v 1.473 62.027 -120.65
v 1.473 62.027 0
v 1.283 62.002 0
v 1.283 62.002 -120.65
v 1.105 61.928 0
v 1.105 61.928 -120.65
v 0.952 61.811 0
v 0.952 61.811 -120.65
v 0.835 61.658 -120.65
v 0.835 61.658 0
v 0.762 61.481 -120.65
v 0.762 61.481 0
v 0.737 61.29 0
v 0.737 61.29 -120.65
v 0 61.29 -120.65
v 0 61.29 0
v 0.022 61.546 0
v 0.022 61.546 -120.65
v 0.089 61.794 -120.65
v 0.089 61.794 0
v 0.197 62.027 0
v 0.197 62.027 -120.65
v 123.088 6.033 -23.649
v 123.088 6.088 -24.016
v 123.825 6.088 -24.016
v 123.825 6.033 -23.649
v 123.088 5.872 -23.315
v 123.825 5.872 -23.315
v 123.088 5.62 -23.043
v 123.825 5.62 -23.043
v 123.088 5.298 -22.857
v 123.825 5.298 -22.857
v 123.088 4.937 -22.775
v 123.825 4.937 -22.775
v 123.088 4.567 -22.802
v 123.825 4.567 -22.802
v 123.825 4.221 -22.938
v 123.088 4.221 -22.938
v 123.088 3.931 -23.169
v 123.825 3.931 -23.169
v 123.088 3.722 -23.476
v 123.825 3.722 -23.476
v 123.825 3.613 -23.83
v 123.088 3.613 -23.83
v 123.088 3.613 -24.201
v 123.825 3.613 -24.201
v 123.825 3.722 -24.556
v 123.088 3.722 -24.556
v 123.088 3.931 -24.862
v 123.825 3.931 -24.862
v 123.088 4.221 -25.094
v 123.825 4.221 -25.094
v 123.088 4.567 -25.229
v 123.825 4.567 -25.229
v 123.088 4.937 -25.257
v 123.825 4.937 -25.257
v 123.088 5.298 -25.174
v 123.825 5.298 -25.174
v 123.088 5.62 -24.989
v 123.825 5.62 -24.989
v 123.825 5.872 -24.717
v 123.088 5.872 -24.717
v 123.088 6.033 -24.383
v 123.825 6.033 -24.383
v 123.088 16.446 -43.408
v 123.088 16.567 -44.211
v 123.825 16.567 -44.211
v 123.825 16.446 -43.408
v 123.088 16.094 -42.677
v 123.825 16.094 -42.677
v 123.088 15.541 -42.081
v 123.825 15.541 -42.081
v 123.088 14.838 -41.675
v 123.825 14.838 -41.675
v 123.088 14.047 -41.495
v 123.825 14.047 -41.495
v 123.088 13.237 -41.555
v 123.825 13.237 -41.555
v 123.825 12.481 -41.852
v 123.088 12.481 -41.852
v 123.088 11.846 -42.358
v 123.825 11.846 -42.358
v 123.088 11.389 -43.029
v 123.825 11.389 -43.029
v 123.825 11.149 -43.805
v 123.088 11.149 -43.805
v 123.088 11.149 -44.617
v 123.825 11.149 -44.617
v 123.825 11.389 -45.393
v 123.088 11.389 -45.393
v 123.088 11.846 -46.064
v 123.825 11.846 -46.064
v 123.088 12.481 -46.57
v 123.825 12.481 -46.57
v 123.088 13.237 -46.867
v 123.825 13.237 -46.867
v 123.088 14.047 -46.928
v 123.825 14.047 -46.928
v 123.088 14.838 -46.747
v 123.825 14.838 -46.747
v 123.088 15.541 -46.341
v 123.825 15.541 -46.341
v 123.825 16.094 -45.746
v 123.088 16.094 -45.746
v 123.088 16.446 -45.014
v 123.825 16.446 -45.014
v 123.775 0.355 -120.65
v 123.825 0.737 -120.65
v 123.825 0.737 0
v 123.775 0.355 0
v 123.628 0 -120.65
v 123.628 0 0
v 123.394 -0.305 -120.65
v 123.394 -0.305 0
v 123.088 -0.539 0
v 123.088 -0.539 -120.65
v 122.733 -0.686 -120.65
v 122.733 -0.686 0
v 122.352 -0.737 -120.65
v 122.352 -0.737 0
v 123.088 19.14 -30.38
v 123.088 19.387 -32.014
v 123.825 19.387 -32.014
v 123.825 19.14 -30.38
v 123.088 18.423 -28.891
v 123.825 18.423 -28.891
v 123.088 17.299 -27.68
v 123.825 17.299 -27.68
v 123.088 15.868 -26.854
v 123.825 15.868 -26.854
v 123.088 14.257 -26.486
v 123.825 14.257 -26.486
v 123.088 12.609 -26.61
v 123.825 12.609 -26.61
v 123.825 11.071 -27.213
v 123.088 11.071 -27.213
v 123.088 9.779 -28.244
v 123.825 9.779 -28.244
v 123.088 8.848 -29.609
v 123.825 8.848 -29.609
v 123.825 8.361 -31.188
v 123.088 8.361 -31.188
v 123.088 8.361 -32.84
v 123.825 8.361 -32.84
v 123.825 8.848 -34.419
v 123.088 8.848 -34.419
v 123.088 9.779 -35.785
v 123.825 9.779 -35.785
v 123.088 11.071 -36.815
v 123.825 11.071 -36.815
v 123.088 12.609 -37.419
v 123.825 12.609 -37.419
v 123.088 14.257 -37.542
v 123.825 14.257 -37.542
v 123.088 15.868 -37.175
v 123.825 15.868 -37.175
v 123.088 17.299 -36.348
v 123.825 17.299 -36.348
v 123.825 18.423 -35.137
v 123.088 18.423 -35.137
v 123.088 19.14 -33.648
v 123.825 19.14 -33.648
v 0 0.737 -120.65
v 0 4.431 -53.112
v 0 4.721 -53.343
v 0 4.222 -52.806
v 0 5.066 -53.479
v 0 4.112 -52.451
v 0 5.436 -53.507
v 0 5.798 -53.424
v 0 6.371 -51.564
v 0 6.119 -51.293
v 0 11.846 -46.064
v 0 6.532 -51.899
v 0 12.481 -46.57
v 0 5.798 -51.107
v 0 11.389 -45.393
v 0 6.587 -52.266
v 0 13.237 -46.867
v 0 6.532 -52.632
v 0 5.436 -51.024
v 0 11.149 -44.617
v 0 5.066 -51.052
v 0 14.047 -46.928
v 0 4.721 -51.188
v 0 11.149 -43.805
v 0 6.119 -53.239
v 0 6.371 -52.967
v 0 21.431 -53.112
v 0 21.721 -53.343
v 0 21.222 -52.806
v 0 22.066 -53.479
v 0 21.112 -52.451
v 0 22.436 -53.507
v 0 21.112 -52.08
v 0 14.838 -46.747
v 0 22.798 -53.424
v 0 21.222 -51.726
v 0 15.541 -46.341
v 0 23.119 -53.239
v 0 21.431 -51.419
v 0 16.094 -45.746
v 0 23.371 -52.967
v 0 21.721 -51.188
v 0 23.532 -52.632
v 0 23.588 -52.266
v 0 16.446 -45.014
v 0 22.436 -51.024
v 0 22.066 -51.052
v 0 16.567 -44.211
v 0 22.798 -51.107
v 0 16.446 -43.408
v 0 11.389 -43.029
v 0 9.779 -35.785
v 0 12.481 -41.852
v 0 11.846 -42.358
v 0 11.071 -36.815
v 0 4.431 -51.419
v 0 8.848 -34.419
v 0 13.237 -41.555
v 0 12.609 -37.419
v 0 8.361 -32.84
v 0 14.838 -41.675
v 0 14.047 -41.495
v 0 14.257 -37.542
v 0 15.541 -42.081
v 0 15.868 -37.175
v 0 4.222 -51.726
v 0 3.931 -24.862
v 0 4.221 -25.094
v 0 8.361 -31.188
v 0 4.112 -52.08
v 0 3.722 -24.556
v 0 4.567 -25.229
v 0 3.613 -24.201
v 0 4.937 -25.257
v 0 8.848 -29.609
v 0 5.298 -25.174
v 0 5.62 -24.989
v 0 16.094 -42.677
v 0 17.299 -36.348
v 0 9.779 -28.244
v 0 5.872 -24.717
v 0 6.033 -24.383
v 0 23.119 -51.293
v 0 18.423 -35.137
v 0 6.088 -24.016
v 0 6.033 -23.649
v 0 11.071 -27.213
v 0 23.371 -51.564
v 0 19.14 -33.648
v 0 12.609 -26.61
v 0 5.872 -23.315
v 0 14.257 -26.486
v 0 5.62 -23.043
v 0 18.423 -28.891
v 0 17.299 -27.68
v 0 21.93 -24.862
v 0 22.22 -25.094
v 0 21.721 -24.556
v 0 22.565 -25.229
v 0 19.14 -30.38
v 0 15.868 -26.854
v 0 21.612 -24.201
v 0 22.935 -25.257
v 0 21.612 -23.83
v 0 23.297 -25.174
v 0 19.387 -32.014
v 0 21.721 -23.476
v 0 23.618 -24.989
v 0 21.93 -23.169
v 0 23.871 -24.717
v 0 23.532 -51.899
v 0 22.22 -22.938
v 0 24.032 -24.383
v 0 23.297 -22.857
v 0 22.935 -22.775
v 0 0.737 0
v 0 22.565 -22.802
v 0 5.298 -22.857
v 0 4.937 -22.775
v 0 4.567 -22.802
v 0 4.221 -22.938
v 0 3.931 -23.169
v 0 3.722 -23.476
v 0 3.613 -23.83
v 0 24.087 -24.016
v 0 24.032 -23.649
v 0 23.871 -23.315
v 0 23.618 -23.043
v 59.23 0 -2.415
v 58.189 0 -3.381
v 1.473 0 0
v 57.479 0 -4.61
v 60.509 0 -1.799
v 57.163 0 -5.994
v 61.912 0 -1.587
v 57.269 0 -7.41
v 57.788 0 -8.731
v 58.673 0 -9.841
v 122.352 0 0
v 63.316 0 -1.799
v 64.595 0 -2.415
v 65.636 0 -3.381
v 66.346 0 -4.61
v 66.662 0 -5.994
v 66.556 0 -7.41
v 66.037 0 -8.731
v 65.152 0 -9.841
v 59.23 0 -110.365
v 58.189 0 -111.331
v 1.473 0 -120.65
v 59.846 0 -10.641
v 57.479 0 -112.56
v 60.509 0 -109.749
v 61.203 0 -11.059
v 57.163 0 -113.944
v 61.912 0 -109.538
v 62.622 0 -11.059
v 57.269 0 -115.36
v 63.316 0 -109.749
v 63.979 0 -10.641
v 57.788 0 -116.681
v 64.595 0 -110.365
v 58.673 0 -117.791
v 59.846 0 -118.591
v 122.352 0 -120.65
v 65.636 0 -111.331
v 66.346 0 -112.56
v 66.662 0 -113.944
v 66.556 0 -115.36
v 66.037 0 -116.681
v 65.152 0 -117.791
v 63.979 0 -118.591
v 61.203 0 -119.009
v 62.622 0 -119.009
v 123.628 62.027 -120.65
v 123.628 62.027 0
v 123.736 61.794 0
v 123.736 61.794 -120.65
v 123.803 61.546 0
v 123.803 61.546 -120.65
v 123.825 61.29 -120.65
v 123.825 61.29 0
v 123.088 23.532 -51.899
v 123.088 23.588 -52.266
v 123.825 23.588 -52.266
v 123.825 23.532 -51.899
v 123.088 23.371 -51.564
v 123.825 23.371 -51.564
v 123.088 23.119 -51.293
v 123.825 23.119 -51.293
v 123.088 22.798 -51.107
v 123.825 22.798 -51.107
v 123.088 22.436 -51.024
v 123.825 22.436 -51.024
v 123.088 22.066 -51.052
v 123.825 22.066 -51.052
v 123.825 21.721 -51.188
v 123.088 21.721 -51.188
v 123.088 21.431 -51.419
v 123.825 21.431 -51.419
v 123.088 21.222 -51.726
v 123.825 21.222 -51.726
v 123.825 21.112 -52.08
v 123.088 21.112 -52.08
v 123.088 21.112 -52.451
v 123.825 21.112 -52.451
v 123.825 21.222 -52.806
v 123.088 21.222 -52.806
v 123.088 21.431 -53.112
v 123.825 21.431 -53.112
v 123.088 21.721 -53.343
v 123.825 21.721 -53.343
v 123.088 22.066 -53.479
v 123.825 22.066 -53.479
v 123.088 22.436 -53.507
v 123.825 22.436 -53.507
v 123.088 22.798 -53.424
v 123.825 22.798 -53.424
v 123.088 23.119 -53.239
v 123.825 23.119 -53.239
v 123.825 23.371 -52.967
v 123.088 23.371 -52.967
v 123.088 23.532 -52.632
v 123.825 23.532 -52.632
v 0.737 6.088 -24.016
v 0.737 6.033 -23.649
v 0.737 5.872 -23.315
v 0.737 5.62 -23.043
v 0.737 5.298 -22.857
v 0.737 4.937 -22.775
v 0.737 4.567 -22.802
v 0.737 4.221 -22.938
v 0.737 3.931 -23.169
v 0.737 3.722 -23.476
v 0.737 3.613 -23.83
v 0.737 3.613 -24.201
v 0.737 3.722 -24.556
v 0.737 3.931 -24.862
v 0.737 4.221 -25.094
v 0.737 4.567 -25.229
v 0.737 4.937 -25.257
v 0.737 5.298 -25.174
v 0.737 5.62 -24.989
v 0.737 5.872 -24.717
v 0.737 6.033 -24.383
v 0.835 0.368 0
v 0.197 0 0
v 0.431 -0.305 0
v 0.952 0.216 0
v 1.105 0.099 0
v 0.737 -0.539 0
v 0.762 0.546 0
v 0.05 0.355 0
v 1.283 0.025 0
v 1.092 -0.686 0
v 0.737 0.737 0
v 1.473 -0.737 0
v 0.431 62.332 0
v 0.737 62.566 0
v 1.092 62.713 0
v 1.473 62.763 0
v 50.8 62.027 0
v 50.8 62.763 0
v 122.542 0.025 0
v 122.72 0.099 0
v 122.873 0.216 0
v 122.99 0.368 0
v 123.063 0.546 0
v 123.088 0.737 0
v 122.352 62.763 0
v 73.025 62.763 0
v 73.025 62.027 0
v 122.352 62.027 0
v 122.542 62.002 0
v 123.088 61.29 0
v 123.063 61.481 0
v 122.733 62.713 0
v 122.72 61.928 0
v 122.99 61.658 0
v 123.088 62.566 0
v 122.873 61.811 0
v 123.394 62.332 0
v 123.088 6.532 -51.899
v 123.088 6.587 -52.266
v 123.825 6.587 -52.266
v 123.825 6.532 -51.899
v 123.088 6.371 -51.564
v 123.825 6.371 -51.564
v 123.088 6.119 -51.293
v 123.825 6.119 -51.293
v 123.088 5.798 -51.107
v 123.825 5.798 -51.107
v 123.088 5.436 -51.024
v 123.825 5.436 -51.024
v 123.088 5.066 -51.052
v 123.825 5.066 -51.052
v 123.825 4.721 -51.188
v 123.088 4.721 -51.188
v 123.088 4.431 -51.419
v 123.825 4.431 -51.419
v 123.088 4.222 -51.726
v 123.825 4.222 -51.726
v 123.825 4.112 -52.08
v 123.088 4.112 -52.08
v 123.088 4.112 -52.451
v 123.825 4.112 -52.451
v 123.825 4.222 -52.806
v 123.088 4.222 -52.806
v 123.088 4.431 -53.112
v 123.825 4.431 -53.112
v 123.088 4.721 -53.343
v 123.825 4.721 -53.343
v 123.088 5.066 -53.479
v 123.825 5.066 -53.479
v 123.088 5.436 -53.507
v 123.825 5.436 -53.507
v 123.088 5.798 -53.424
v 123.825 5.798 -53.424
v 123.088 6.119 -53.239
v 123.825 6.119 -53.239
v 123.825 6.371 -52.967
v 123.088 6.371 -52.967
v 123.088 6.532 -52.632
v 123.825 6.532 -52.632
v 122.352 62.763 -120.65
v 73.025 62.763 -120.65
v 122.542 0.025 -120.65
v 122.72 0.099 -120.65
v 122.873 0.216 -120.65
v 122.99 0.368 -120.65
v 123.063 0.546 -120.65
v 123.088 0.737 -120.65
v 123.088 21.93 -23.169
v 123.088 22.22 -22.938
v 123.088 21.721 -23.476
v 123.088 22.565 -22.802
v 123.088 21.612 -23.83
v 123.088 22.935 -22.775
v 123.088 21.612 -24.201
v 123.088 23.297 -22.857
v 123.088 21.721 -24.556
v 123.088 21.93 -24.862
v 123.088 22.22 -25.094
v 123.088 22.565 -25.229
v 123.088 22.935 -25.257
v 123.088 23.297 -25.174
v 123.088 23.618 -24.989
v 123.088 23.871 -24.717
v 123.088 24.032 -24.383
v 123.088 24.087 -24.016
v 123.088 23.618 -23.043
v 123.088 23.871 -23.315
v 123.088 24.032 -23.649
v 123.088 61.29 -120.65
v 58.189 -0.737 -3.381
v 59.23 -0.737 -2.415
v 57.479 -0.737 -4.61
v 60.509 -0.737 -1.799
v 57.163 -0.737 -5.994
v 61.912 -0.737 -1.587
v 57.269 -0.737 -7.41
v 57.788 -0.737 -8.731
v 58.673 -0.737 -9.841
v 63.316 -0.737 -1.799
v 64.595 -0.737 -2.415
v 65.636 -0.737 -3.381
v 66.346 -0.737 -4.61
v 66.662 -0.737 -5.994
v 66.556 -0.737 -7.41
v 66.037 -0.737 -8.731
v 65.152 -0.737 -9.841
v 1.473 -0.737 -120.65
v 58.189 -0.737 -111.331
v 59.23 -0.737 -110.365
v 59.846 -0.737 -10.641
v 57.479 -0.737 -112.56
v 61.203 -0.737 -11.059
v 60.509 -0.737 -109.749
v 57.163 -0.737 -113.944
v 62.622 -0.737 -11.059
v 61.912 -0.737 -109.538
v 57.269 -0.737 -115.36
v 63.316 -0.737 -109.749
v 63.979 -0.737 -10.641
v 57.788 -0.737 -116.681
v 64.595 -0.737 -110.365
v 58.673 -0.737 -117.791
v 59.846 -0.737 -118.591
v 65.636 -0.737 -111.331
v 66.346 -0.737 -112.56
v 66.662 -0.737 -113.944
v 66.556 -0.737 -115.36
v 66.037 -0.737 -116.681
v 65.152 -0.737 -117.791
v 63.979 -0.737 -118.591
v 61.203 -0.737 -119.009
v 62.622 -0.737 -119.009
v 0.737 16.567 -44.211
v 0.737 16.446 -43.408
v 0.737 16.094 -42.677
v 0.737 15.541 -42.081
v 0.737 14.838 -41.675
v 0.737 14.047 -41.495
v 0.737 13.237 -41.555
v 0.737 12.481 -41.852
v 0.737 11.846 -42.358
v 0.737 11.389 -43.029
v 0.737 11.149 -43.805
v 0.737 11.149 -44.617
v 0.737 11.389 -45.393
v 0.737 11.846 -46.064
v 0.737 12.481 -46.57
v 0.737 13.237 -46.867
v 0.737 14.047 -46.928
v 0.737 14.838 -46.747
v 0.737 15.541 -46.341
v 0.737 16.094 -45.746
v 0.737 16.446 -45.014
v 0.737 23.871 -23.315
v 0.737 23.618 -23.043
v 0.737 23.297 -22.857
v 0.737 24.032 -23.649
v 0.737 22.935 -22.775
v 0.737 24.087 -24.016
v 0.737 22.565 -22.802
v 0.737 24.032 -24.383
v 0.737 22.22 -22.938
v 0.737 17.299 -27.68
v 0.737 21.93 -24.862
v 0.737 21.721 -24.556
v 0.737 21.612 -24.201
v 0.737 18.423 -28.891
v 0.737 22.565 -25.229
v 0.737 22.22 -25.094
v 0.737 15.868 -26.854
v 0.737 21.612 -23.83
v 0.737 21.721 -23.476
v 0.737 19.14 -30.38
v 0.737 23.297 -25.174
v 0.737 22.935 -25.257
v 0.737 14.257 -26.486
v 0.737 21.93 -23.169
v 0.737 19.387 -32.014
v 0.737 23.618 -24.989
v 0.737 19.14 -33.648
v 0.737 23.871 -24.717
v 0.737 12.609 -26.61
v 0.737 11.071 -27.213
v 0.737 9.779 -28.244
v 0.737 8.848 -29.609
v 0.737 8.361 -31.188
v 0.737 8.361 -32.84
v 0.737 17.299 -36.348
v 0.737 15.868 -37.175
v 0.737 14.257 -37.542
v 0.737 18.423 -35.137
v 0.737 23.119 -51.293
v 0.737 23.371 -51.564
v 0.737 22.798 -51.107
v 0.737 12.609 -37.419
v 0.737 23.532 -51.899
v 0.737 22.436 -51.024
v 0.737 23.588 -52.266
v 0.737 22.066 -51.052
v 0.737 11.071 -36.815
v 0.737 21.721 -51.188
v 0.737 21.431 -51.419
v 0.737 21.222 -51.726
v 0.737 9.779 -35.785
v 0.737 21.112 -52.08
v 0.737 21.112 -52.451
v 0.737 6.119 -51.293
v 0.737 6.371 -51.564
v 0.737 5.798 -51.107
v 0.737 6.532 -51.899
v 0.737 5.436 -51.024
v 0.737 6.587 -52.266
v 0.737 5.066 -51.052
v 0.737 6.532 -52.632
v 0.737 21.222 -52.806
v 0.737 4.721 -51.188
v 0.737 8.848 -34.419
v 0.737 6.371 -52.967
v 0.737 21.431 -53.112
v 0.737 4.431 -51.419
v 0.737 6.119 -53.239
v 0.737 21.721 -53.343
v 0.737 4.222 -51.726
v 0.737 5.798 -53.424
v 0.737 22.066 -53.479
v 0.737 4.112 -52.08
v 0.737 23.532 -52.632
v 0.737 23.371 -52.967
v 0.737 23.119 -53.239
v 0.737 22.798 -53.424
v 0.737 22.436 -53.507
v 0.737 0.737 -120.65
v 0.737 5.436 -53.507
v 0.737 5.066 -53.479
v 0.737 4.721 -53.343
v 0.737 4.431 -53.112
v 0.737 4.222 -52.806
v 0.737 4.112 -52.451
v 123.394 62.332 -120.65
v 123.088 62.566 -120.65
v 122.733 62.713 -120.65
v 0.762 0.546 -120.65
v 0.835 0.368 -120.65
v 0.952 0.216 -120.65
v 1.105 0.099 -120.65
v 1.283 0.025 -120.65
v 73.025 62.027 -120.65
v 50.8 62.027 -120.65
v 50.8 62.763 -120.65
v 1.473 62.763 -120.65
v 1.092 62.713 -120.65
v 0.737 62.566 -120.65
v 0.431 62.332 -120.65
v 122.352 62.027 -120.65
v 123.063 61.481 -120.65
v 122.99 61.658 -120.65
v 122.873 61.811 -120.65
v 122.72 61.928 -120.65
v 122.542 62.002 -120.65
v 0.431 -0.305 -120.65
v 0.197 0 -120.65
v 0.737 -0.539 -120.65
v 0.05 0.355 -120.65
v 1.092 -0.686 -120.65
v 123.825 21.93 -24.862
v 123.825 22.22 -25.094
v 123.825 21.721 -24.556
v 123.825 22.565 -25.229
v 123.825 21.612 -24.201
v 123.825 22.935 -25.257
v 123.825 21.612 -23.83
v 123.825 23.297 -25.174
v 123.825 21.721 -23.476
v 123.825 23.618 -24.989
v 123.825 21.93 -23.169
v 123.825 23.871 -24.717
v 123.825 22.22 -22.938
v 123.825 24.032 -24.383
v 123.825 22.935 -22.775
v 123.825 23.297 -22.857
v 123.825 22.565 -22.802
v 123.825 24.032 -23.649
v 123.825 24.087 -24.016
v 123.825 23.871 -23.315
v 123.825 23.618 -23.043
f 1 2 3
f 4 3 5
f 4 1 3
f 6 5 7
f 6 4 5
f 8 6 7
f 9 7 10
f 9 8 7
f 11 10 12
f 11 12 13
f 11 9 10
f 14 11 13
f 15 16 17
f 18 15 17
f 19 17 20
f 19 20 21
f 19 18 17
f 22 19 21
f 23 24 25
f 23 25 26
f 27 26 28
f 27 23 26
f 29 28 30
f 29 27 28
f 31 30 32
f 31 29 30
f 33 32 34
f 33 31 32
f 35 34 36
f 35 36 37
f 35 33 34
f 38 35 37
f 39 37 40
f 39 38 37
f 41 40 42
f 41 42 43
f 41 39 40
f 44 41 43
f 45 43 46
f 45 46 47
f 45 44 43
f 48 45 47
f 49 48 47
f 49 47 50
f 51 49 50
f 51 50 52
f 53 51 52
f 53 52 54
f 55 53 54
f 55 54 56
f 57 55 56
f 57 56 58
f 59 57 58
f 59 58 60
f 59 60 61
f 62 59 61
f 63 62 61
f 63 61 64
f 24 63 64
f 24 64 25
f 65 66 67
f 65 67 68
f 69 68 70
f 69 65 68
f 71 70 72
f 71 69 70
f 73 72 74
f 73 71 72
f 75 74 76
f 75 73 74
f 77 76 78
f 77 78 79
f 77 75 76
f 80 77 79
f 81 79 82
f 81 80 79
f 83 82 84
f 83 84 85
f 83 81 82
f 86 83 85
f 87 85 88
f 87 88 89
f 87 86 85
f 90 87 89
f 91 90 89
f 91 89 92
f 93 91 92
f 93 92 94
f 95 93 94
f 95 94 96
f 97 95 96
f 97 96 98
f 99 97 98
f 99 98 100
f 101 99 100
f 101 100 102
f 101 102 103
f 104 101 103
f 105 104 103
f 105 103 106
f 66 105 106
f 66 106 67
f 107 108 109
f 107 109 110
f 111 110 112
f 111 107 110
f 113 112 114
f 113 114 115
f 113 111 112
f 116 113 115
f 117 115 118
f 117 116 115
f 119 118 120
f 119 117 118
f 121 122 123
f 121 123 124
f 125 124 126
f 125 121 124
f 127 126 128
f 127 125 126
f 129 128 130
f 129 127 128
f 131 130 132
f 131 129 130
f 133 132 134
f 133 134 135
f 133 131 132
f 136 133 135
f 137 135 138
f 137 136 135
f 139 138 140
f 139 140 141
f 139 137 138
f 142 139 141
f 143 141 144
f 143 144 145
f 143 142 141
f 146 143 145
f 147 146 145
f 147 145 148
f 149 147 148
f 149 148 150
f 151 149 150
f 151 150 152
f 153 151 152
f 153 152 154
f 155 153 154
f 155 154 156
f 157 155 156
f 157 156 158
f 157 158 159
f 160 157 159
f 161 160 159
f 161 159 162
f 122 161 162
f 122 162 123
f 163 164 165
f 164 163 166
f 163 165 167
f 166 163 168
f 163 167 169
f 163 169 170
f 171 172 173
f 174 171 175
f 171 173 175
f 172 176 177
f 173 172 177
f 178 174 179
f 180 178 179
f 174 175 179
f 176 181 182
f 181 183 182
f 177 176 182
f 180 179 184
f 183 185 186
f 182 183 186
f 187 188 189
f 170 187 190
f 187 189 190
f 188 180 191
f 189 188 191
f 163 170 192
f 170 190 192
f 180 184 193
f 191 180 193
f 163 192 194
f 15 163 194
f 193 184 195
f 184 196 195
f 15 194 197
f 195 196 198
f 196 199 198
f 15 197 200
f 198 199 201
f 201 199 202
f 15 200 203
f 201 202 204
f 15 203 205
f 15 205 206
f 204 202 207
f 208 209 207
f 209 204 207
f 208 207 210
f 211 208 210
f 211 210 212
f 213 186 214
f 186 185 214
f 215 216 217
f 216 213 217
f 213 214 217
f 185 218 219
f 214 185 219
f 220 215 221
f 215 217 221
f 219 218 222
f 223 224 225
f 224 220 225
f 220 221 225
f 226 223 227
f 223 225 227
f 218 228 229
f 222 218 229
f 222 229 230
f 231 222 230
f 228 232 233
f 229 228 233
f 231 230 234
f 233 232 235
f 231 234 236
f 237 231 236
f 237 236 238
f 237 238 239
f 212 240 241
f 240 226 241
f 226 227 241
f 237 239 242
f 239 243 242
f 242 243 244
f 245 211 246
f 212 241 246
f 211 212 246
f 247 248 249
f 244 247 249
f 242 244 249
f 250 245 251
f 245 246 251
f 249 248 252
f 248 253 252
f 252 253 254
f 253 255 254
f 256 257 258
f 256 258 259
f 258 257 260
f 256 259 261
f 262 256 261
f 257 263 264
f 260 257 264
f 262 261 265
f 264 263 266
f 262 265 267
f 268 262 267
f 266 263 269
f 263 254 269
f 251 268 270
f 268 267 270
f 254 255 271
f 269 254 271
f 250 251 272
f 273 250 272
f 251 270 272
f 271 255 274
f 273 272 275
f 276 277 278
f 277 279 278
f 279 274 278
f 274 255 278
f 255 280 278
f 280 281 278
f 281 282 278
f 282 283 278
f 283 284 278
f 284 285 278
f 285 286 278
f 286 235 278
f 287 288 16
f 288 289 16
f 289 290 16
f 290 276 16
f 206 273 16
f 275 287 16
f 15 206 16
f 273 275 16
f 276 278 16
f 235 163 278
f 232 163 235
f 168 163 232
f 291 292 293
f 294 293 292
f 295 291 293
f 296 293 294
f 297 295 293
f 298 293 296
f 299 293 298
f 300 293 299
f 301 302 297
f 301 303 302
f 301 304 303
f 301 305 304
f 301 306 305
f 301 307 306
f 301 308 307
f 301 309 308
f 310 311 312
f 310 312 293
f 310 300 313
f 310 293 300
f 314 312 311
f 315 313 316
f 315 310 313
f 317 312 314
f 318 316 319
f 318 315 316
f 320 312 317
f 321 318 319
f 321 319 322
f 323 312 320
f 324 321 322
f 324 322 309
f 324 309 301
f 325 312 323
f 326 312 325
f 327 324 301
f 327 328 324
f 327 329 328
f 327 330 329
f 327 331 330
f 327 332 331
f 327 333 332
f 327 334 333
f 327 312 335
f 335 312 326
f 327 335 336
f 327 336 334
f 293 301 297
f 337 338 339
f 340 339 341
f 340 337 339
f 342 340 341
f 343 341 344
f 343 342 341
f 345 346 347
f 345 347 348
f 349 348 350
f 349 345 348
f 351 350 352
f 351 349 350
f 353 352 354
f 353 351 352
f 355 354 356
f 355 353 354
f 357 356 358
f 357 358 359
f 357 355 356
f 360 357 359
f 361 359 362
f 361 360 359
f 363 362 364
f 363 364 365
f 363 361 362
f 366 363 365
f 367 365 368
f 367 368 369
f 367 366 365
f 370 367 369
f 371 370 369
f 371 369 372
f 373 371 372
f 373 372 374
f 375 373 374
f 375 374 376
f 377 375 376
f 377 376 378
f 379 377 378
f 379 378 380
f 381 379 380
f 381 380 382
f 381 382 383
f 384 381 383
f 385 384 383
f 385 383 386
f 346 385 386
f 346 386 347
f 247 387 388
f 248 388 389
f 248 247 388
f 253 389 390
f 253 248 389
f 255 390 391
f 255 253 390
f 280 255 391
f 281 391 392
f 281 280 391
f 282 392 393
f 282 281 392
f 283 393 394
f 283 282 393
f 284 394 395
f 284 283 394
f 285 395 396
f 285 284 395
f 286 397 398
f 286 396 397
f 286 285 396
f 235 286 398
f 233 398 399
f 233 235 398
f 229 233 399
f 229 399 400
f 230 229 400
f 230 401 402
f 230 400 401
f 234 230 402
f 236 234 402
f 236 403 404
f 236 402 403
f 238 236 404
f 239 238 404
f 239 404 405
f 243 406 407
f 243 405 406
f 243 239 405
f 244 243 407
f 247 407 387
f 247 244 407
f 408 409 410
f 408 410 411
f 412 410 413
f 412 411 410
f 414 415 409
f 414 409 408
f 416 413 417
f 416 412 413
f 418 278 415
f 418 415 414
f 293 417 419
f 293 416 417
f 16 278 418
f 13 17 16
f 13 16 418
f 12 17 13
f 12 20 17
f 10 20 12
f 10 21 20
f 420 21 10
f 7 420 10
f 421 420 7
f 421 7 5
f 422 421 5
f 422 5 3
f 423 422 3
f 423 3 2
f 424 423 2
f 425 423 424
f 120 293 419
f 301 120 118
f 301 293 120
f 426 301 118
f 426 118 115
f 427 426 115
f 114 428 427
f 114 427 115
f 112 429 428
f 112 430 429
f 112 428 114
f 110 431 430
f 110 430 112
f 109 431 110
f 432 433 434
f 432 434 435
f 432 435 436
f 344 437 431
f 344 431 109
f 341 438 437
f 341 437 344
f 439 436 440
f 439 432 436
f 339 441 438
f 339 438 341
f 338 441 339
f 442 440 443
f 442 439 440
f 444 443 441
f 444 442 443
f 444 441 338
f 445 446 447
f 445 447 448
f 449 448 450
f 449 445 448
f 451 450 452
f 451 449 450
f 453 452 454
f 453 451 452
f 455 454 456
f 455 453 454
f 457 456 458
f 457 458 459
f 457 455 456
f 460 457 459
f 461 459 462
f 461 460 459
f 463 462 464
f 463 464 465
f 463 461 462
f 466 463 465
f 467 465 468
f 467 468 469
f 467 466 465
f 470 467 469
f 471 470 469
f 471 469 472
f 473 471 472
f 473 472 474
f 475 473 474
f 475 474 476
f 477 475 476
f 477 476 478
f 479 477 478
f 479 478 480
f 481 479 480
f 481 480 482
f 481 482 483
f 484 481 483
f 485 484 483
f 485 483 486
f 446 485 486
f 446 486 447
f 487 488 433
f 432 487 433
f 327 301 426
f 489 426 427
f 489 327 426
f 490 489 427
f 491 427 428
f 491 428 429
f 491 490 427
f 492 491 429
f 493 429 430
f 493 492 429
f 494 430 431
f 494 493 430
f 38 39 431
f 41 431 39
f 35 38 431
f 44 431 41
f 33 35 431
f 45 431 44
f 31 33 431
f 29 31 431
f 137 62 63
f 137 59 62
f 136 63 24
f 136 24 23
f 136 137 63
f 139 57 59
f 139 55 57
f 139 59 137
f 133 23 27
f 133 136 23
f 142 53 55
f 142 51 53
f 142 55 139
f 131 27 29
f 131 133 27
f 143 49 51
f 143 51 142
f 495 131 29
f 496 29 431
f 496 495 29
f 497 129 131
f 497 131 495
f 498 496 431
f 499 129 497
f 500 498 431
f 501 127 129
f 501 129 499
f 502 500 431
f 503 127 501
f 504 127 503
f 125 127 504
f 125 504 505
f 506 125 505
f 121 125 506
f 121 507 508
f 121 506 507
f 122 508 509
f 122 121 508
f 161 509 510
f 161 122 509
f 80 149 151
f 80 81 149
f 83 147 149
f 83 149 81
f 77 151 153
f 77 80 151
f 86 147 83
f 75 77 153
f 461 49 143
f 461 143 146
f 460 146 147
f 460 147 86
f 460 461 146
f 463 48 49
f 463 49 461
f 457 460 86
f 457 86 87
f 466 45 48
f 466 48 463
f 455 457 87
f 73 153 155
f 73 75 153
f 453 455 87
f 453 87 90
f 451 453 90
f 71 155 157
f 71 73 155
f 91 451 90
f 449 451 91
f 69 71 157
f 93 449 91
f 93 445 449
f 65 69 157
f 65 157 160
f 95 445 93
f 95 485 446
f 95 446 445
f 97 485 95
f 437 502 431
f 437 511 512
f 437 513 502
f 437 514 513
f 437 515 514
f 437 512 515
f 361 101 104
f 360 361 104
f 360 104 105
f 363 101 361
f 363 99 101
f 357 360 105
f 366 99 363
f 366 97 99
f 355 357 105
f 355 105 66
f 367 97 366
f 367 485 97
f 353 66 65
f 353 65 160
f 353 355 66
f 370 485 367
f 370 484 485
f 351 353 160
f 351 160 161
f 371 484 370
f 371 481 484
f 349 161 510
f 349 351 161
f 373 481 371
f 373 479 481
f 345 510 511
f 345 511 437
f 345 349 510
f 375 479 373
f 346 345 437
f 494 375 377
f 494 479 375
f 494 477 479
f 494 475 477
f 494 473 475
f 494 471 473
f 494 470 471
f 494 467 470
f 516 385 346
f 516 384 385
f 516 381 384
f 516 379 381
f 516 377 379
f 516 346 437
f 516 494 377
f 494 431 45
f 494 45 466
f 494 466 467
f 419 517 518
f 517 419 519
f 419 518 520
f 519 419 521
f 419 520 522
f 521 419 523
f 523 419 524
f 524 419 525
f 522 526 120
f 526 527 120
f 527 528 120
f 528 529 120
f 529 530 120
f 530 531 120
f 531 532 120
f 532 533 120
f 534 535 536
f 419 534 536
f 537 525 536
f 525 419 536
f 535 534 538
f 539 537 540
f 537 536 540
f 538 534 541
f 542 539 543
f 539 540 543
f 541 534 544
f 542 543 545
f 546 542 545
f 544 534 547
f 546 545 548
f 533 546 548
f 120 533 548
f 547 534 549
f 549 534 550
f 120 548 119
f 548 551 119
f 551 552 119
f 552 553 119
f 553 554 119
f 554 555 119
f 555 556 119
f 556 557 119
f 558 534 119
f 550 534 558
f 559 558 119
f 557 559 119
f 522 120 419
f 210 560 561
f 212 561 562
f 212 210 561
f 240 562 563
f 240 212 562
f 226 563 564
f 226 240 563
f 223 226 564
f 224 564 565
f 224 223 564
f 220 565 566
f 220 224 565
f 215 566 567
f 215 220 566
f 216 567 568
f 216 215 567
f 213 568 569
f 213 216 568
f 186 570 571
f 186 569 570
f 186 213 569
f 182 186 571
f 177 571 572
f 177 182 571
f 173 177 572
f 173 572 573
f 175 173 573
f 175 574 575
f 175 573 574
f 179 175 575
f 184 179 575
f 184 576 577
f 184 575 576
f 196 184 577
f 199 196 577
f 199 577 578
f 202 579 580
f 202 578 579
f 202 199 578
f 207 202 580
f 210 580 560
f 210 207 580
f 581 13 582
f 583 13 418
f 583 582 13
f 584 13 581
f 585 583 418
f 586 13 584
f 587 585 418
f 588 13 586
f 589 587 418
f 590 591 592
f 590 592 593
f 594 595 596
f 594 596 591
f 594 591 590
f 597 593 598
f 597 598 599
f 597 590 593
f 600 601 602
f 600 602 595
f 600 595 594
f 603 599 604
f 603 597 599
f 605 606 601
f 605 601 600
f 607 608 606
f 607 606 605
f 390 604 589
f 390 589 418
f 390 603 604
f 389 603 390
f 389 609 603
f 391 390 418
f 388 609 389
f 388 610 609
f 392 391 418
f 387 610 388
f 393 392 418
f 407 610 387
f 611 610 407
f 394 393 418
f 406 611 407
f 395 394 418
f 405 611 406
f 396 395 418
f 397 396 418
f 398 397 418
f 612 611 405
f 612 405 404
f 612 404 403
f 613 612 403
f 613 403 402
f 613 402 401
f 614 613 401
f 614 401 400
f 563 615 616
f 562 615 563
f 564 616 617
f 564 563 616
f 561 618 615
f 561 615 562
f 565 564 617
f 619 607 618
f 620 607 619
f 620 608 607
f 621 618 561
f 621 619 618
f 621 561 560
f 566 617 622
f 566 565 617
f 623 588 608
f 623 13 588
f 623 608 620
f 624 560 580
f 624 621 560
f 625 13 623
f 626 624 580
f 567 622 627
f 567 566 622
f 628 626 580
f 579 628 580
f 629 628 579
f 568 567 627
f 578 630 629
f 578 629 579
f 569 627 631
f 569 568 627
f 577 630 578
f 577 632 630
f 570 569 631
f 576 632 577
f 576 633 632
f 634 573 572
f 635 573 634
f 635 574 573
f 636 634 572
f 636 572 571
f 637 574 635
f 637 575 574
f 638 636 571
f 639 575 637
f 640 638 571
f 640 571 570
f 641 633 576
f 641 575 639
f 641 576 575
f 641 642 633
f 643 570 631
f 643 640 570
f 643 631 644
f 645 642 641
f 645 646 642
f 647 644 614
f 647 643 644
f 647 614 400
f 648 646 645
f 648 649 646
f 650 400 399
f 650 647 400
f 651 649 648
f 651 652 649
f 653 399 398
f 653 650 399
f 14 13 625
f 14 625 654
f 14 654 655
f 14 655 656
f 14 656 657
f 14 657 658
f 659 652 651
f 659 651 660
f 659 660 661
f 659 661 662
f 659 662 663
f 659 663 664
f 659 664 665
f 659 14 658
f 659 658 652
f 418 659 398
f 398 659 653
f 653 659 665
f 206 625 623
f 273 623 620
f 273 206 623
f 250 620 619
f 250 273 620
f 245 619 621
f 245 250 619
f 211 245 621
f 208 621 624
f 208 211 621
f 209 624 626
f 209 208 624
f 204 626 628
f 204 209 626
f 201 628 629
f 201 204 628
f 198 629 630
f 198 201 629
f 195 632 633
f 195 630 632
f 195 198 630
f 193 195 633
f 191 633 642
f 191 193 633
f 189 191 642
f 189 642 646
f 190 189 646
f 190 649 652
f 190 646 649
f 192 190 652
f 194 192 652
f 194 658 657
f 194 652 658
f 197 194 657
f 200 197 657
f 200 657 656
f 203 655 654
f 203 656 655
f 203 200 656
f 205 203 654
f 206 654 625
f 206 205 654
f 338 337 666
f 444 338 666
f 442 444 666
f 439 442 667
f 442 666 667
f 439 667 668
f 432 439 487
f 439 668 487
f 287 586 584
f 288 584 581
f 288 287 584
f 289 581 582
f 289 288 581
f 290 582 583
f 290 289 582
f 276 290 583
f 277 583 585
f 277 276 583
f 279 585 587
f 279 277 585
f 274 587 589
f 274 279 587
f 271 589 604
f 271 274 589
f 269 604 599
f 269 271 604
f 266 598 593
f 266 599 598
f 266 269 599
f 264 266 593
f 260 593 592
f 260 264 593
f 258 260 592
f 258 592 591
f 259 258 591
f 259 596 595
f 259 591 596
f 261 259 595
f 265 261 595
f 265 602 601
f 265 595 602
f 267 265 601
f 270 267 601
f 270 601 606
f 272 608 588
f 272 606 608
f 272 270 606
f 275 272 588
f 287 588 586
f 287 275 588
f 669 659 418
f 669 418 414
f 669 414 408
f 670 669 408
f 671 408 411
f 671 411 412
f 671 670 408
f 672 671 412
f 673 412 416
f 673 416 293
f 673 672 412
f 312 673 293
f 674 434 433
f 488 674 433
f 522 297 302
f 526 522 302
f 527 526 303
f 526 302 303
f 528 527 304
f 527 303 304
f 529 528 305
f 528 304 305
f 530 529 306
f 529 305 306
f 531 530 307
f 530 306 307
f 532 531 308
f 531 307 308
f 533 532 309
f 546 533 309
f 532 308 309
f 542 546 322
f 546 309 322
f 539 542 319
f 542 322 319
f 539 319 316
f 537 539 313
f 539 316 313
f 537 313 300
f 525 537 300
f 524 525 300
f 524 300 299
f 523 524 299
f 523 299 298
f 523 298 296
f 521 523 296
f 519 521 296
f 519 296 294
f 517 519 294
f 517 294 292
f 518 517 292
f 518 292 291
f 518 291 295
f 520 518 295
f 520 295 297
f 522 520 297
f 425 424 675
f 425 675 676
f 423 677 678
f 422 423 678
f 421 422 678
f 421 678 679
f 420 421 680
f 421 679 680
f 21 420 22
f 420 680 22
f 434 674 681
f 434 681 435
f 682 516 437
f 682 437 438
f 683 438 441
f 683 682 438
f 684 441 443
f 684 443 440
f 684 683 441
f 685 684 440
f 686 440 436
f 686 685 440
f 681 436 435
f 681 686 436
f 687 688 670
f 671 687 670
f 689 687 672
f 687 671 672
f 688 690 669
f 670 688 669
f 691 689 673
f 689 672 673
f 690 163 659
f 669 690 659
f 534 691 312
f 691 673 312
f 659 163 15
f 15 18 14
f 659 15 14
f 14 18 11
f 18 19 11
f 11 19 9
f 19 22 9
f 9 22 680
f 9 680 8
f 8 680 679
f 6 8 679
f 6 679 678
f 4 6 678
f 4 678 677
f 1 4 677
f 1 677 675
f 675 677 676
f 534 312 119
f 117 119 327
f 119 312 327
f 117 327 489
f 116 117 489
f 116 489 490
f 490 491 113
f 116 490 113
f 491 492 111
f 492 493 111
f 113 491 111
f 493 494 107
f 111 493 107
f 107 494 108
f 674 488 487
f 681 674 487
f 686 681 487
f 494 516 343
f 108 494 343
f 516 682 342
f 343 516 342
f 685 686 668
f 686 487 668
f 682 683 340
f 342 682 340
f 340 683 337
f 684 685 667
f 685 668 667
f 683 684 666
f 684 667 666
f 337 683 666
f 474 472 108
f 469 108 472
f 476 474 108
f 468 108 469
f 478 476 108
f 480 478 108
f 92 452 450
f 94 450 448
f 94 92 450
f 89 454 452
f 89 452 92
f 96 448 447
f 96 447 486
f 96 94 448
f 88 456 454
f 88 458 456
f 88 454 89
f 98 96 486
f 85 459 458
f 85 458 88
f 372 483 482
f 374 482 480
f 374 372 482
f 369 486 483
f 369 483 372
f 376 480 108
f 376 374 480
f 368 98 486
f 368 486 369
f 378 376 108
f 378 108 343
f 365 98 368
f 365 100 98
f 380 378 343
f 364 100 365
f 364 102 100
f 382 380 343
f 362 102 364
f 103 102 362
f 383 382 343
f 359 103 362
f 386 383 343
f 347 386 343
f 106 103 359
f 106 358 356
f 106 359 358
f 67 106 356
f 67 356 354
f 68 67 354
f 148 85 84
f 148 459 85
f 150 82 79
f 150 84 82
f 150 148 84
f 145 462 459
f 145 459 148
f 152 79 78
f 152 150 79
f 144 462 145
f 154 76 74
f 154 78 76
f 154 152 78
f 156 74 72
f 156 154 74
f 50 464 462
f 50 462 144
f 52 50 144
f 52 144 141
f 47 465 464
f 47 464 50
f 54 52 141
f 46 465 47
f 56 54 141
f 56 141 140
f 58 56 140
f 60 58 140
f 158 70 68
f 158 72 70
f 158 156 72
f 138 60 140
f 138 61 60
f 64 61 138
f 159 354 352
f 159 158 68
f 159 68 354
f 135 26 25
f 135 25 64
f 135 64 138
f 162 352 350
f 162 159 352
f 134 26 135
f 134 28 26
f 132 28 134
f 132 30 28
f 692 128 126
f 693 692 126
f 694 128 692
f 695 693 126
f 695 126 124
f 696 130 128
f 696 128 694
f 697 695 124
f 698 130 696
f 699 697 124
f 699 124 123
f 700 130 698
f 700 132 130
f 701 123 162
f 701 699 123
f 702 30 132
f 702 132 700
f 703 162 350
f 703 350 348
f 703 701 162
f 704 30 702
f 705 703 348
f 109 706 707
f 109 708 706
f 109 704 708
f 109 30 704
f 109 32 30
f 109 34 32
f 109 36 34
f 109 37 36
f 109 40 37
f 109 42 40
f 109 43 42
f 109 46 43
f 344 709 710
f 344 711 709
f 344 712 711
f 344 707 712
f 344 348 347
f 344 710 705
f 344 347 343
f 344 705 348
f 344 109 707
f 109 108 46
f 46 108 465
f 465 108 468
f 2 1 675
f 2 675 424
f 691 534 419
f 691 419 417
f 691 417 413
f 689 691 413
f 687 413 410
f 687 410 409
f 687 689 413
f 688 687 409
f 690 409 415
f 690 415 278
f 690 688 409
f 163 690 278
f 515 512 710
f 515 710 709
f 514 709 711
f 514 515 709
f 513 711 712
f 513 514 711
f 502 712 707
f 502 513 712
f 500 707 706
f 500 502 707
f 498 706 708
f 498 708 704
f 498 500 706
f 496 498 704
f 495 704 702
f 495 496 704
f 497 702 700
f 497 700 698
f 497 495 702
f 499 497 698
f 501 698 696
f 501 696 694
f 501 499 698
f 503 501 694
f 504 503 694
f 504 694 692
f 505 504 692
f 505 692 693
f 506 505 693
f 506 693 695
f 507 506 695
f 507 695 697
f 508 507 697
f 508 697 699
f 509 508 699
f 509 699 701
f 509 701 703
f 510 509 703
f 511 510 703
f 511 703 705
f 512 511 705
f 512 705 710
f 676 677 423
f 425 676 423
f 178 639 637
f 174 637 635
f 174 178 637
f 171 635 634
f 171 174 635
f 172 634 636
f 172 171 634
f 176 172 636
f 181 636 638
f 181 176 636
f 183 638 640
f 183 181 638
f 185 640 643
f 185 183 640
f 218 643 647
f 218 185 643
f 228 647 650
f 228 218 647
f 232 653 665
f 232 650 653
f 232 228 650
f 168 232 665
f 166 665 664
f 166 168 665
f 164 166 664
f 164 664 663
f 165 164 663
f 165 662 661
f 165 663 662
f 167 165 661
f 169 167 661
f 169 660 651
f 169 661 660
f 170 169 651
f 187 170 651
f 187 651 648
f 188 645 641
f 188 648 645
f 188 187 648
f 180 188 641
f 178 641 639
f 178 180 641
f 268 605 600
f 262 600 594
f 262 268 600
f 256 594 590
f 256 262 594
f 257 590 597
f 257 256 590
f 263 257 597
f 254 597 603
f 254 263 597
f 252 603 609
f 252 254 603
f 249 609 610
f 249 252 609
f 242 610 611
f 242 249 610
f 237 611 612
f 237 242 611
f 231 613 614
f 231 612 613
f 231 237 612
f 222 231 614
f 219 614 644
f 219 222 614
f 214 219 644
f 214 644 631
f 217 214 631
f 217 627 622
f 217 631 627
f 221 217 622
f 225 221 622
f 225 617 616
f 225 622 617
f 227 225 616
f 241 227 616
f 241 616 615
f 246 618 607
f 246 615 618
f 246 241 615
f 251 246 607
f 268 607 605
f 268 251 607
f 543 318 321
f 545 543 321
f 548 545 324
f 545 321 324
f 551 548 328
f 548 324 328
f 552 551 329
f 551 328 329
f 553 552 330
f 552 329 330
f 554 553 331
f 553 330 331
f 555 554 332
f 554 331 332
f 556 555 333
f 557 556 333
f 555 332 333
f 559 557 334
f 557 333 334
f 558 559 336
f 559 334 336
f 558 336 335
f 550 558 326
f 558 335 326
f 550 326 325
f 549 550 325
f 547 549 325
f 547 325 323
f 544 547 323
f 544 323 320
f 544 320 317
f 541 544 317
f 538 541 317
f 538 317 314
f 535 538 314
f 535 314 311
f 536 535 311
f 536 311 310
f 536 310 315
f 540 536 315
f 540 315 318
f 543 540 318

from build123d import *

# Parameters (mm, degrees)
SKETCH1_W                      = 123.825
SKETCH1_H                      = 120.65
BASE_FLANGE1_DEPTH             = 0.7366
EDGE_FLANGE1_STRIP_W           = 4.4196
EDGE_FLANGE1_STRIP_H           = 0.7366
EDGE_FLANGE1_STRIP_CUT_DEPTH   = 120.65
EDGE_FLANGE1_STRIP_2_W         = 4.4196
EDGE_FLANGE1_STRIP_2_H         = 0.7366
EDGE_FLANGE1_STRIP_CUT_2_DEPTH = 120.65
EDGE_FLANGE1_DEPTH             = 120.65
EDGE_FLANGE1_BEND_DEPTH        = 120.65
EDGE_FLANGE2_STRIP_W           = 4.4196
EDGE_FLANGE2_STRIP_H           = 0.7366
EDGE_FLANGE2_STRIP_CUT_DEPTH   = 120.65
EDGE_FLANGE2_DEPTH             = 120.65
EDGE_FLANGE3_STRIP_W           = 4.4196
EDGE_FLANGE3_STRIP_H           = 0.7366
EDGE_FLANGE3_STRIP_CUT_DEPTH   = 120.65
EDGE_FLANGE3_DEPTH             = 120.65
F_4_CLEARANCE_HOLE1_D          = 2.4892
SKETCH28_R                     = 5.54355
SKETCH28_R_2                   = 2.72415
CUT_EXTRUDE1_DEPTH             = 221.859453756
UNFOLD1_OUTLINE_W              = 50.8
UNFOLD1_OUTLINE_H              = 120.65
UNFOLD1_DEPTH                  = 62.7634
UNFOLD1_START                  = -0.7366
UNFOLD1_2_OUTLINE_W            = 162.678345723
UNFOLD1_2_OUTLINE_H            = 120.65
UNFOLD1_2_OUTLINE_R            = 1.2446
UNFOLD1_2_OUTLINE_R_2          = 5.54355
UNFOLD1_2_OUTLINE_R_3          = 2.72415
UNFOLD1_2_DEPTH                = 0.7366
SKETCH30_R                     = 4.7625
CUT_EXTRUDE2_DEPTH             = 1.27
FOLD1_START                    = -111.878345723
FOLD1_OUTLINE_W                = 0.7366
FOLD1_OUTLINE_H                = 120.65
FOLD1_DEPTH                    = 112.029702291
FOLD1_START_2                  = 123.673643432
FOLD1_2_OUTLINE_W              = 0.7366
FOLD1_2_OUTLINE_H              = 120.65
FOLD1_2_DEPTH                  = 112.029702291
FOLD1_START_3                  = 1.4732
FOLD1_3_OUTLINE_W              = 0.7366
FOLD1_3_OUTLINE_H              = 120.65
FOLD1_3_DEPTH                  = 49.3268
FOLD1_START_4                  = 73.025
FOLD1_4_OUTLINE_W              = 0.7366
FOLD1_4_OUTLINE_H              = 120.65
FOLD1_4_DEPTH                  = 49.3268
FOLD1_START_5                  = 0.732563432
FOLD1_5_OUTLINE_W              = 62.0268
FOLD1_5_OUTLINE_H              = 120.65
FOLD1_5_OUTLINE_R              = 1.2446
FOLD1_5_OUTLINE_R_2            = 2.72415
FOLD1_5_OUTLINE_R_3            = 5.54355
FOLD1_5_DEPTH                  = 0.004036568
FOLD1_START_6                  = 123.0884
FOLD1_6_OUTLINE_W              = 62.0268
FOLD1_6_OUTLINE_H              = 120.65
FOLD1_6_OUTLINE_R              = 1.2446
FOLD1_6_OUTLINE_R_2            = 2.72415
FOLD1_6_OUTLINE_R_3            = 5.54355
FOLD1_6_DEPTH                  = 0.004036568
FOLD1_7_OUTLINE_W              = 62.0268
FOLD1_7_OUTLINE_H              = 120.65
FOLD1_7_OUTLINE_R              = 1.2446
FOLD1_7_OUTLINE_R_2            = 2.72415
FOLD1_7_OUTLINE_R_3            = 5.54355
FOLD1_7_DEPTH                  = 1.4732
FOLD1_START_7                  = 122.3518
FOLD1_8_OUTLINE_W              = 62.0268
FOLD1_8_OUTLINE_H              = 120.65
FOLD1_8_OUTLINE_R              = 1.2446
FOLD1_8_OUTLINE_R_2            = 2.72415
FOLD1_8_OUTLINE_R_3            = 5.54355
FOLD1_8_DEPTH                  = 1.4732
FOLD1_START_8                  = -120.65
FOLD1_9_DEPTH                  = 120.65
FOLD1_10_DEPTH                 = 120.65


with BuildPart() as part:
    # Base-Flange1: sheet metal written as solids
    # Sketch1 → Base-Flange1 (new body)
    with BuildSketch(Plane(origin=(0, 0, 0), x_dir=(1, 0, 0), z_dir=(0, 1, 0))):
        with Locations((61.9125, 60.325)):
            Rectangle(SKETCH1_W, SKETCH1_H)
    extrude(amount=-BASE_FLANGE1_DEPTH)

    # Edge-Flange1: sheet metal written as solids
    # Edge-Flange1 strip (on a plane across the edge) → Edge-Flange1 strip cut (cut)
    with BuildSketch(Plane(origin=(123.825, 0, 0), x_dir=(-1, 0, 0), z_dir=(0, 0, -1))):
        with Locations((-0.7366, -0.3683)):
            Rectangle(EDGE_FLANGE1_STRIP_W, EDGE_FLANGE1_STRIP_H)
    extrude(amount=EDGE_FLANGE1_STRIP_CUT_DEPTH, mode=Mode.SUBTRACT)

    # Edge-Flange1 strip 2 (on a plane across the edge) → Edge-Flange1 strip cut 2 (cut)
    with BuildSketch(Plane.XY.offset(-120.65)):
        with Locations((-0.7366, -0.3683)):
            Rectangle(EDGE_FLANGE1_STRIP_2_W, EDGE_FLANGE1_STRIP_2_H)
    extrude(amount=EDGE_FLANGE1_STRIP_CUT_2_DEPTH, mode=Mode.SUBTRACT)

    # Edge-Flange1 section (on a plane across the edge) → Edge-Flange1 (add)
    with BuildSketch(Plane(origin=(123.825, 0, 0), x_dir=(-1, 0, 0), z_dir=(0, 0, -1))):
        with BuildLine():
            Line((0, 0.7366), (0, 62.7634))
            Line((0, 62.7634), (0.7366, 62.7634))
            Line((0.7366, 62.7634), (0.7366, 0.7366))
            ThreePointArc((0.7366, 0.7366), (0.952345145, 0.215745145), (1.4732, 0))
            Line((1.4732, 0), (1.4732, -0.7366))
            ThreePointArc((1.4732, -0.7366), (0.43149029, -0.30510971), (0, 0.7366))
        make_face()
    extrude(amount=EDGE_FLANGE1_DEPTH)

    # Edge-Flange1 section 2 (on a plane across the edge) → Edge-Flange1 bend (add)
    with BuildSketch(Plane.XY.offset(-120.65)):
        with BuildLine():
            Line((0, 0.7366), (0, 62.7634))
            Line((0, 62.7634), (0.7366, 62.7634))
            Line((0.7366, 62.7634), (0.7366, 0.7366))
            ThreePointArc((0.7366, 0.7366), (0.952345145, 0.215745145), (1.4732, 0))
            Line((1.4732, 0), (1.4732, -0.7366))
            ThreePointArc((1.4732, -0.7366), (0.43149029, -0.30510971), (0, 0.7366))
        make_face()
    extrude(amount=EDGE_FLANGE1_BEND_DEPTH)

    # Edge-Flange2: sheet metal written as solids
    # Edge-Flange2 strip (on a plane across the edge) → Edge-Flange2 strip cut (cut)
    with BuildSketch(Plane(origin=(123.0884, 62.7634, 0), x_dir=(0, -1, 0), z_dir=(0, 0, -1))):
        with Locations((-0.7366, -0.3683)):
            Rectangle(EDGE_FLANGE2_STRIP_W, EDGE_FLANGE2_STRIP_H)
    extrude(amount=EDGE_FLANGE2_STRIP_CUT_DEPTH, mode=Mode.SUBTRACT)

    # Edge-Flange2 section (on a plane across the edge) → Edge-Flange2 (add)
    with BuildSketch(Plane(origin=(123.0884, 62.7634, 0), x_dir=(0, -1, 0), z_dir=(0, 0, -1))):
        with BuildLine():
            Line((0, 0.7366), (0, 50.0634))
            Line((0, 50.0634), (0.7366, 50.0634))
            Line((0.7366, 50.0634), (0.7366, 0.7366))
            ThreePointArc((0.7366, 0.7366), (0.952345145, 0.215745145), (1.4732, 0))
            Line((1.4732, 0), (1.4732, -0.7366))
            ThreePointArc((1.4732, -0.7366), (0.43149029, -0.30510971), (0, 0.7366))
        make_face()
    extrude(amount=EDGE_FLANGE2_DEPTH)

    # Edge-Flange3: sheet metal written as solids
    # Edge-Flange3 strip (on a plane across the edge) → Edge-Flange3 strip cut (cut)
    with BuildSketch(Plane(origin=(0.7366, 62.7634, -120.65), x_dir=(0, -1, 0), z_dir=(0, 0, 1))):
        with Locations((-0.7366, -0.3683)):
            Rectangle(EDGE_FLANGE3_STRIP_W, EDGE_FLANGE3_STRIP_H)
    extrude(amount=EDGE_FLANGE3_STRIP_CUT_DEPTH, mode=Mode.SUBTRACT)

    # Edge-Flange3 section (on a plane across the edge) → Edge-Flange3 (add)
    with BuildSketch(Plane(origin=(0.7366, 62.7634, -120.65), x_dir=(0, -1, 0), z_dir=(0, 0, 1))):
        with BuildLine():
            Line((0, 0.7366), (0, 50.0634))
            Line((0, 50.0634), (0.7366, 50.0634))
            Line((0.7366, 50.0634), (0.7366, 0.7366))
            ThreePointArc((0.7366, 0.7366), (0.952345145, 0.215745145), (1.4732, 0))
            Line((1.4732, 0), (1.4732, -0.7366))
            ThreePointArc((1.4732, -0.7366), (0.43149029, -0.30510971), (0, 0.7366))
        make_face()
    extrude(amount=EDGE_FLANGE3_DEPTH)

    # #4 Clearance Hole1 (through all)
    with Locations(Plane(origin=(123.825, -24.718066827, -160.602803993), x_dir=(0, 0, -1), z_dir=(1, 0, 0))):
        with Locations((-136.587103993, 47.560286827), (-136.587103993, 29.561846827), (-108.337223993, 47.061176827), (-108.337223993, 30.060956827)):
            Hole(F_4_CLEARANCE_HOLE1_D / 2)

    # Sketch28 → Cut-Extrude1 (cut, through all)
    with BuildSketch(Plane(origin=(123.825, -24.718066827, -160.602803993), x_dir=(0, 0, -1), z_dir=(1, 0, 0))):
        with Locations(Location((-128.588643993, 38.561066827, 0), (0, 0, 90))):
            Circle(SKETCH28_R)
        with Locations(Location((-116.391563993, 38.561066827, 0), (0, 0, 90))):
            Circle(SKETCH28_R_2)
    extrude(amount=-CUT_EXTRUDE1_DEPTH, mode=Mode.SUBTRACT)

    # Unfold1: read off the stored shape, not the designer's step
    # Unfold1 outline → Unfold1 (cut)
    with BuildSketch(Plane(origin=(0, 0, 0), x_dir=(1, 0, 0), z_dir=(0, 1, 0))):
        with Locations((25.4, 60.325)):
            Rectangle(UNFOLD1_OUTLINE_W, UNFOLD1_OUTLINE_H)
        with Locations((98.425, 60.325)):
            Rectangle(UNFOLD1_OUTLINE_W, UNFOLD1_OUTLINE_H)
    extrude(amount=UNFOLD1_DEPTH, mode=Mode.SUBTRACT)

    # Unfold1 2 outline → Unfold1 2 (add)
    # profile 1 of 2: a face of its own
    with BuildSketch(Plane(origin=(0, 0, 0), x_dir=(1, 0, 0), z_dir=(0, 1, 0)).offset(UNFOLD1_START)):
        with Locations((-30.539172862, 60.325)):
            Rectangle(UNFOLD1_2_OUTLINE_W, UNFOLD1_2_OUTLINE_H)
        with Locations((-22.367992861, 24.0157)):
            Circle(UNFOLD1_2_OUTLINE_R, mode=Mode.SUBTRACT)
        with Locations((-4.369552861, 24.0157)):
            Circle(UNFOLD1_2_OUTLINE_R, mode=Mode.SUBTRACT)
        with Locations((-13.368772861, 32.01416)):
            Circle(UNFOLD1_2_OUTLINE_R_2, mode=Mode.SUBTRACT)
        with Locations((-13.368772861, 44.21124)):
            Circle(UNFOLD1_2_OUTLINE_R_3, mode=Mode.SUBTRACT)
        with Locations((-21.868882861, 52.26558)):
            Circle(UNFOLD1_2_OUTLINE_R, mode=Mode.SUBTRACT)
        with Locations((-4.868662861, 52.26558)):
            Circle(UNFOLD1_2_OUTLINE_R, mode=Mode.SUBTRACT)
    # profile 2 of 2: a face of its own
    with BuildSketch(Plane(origin=(0, 0, 0), x_dir=(1, 0, 0), z_dir=(0, 1, 0)).offset(UNFOLD1_START)):
        with Locations((154.364172862, 60.325)):
            Rectangle(UNFOLD1_2_OUTLINE_W, UNFOLD1_2_OUTLINE_H)
        with Locations((145.693882861, 52.26558)):
            Circle(UNFOLD1_2_OUTLINE_R, mode=Mode.SUBTRACT)
        with Locations((128.194552861, 24.0157)):
            Circle(UNFOLD1_2_OUTLINE_R, mode=Mode.SUBTRACT)
        with Locations((146.192992861, 24.0157)):
            Circle(UNFOLD1_2_OUTLINE_R, mode=Mode.SUBTRACT)
        with Locations((137.193772861, 32.01416)):
            Circle(UNFOLD1_2_OUTLINE_R_2, mode=Mode.SUBTRACT)
        with Locations((137.193772861, 44.21124)):
            Circle(UNFOLD1_2_OUTLINE_R_3, mode=Mode.SUBTRACT)
        with Locations((128.693662861, 52.26558)):
            Circle(UNFOLD1_2_OUTLINE_R, mode=Mode.SUBTRACT)
    extrude(amount=UNFOLD1_2_DEPTH)

    # Sketch30 → Cut-Extrude2 (cut)
    with BuildSketch(Plane(origin=(0, 0, 0), x_dir=(1, 0, 0), z_dir=(0, 1, 0))):
        with Locations(Location((61.9125, 114.3, 0), (0, 0, 270))):
            Circle(SKETCH30_R)
        with Locations(Location((61.9125, 6.35, 0), (0, 0, 270))):
            Circle(SKETCH30_R)
    extrude(amount=-CUT_EXTRUDE2_DEPTH, mode=Mode.SUBTRACT)

    # Fold1: read off the stored shape, not the designer's step
    # Fold1 outline → Fold1 (cut)
    with BuildSketch(Plane.YZ.offset(FOLD1_START)):
        with Locations((-0.3683, -60.325)):
            Rectangle(FOLD1_OUTLINE_W, FOLD1_OUTLINE_H)
    extrude(amount=FOLD1_DEPTH, mode=Mode.SUBTRACT)

    # Fold1 2 outline → Fold1 2 (cut)
    with BuildSketch(Plane.YZ.offset(FOLD1_START_2)):
        with Locations((-0.3683, -60.325)):
            Rectangle(FOLD1_2_OUTLINE_W, FOLD1_2_OUTLINE_H)
    extrude(amount=FOLD1_2_DEPTH, mode=Mode.SUBTRACT)

    # Fold1 5 outline → Fold1 5 (add)
    with BuildSketch(Plane.YZ.offset(FOLD1_START_5)):
        with Locations((31.0134, -60.325)):
            Rectangle(FOLD1_5_OUTLINE_W, FOLD1_5_OUTLINE_H)
        with Locations((5.34289, -52.26558)):
            Circle(FOLD1_5_OUTLINE_R, mode=Mode.SUBTRACT)
        with Locations((13.843, -44.21124)):
            Circle(FOLD1_5_OUTLINE_R_2, mode=Mode.SUBTRACT)
        with Locations((13.843, -32.01416)):
            Circle(FOLD1_5_OUTLINE_R_3, mode=Mode.SUBTRACT)
        with Locations((22.34311, -52.26558)):
            Circle(FOLD1_5_OUTLINE_R, mode=Mode.SUBTRACT)
        with Locations((4.84378, -24.0157)):
            Circle(FOLD1_5_OUTLINE_R, mode=Mode.SUBTRACT)
        with Locations((22.84222, -24.0157)):
            Circle(FOLD1_5_OUTLINE_R, mode=Mode.SUBTRACT)
    extrude(amount=FOLD1_5_DEPTH)

    # Fold1 6 outline → Fold1 6 (add)
    with BuildSketch(Plane.YZ.offset(FOLD1_START_6)):
        with Locations((31.0134, -60.325)):
            Rectangle(FOLD1_6_OUTLINE_W, FOLD1_6_OUTLINE_H)
        with Locations((5.34289, -52.26558)):
            Circle(FOLD1_6_OUTLINE_R, mode=Mode.SUBTRACT)
        with Locations((13.843, -44.21124)):
            Circle(FOLD1_6_OUTLINE_R_2, mode=Mode.SUBTRACT)
        with Locations((13.843, -32.01416)):
            Circle(FOLD1_6_OUTLINE_R_3, mode=Mode.SUBTRACT)
        with Locations((22.34311, -52.26558)):
            Circle(FOLD1_6_OUTLINE_R, mode=Mode.SUBTRACT)
        with Locations((4.84378, -24.0157)):
            Circle(FOLD1_6_OUTLINE_R, mode=Mode.SUBTRACT)
        with Locations((22.84222, -24.0157)):
            Circle(FOLD1_6_OUTLINE_R, mode=Mode.SUBTRACT)
    extrude(amount=FOLD1_6_DEPTH)



with BuildPart() as body_2:
    # Fold1 3 outline → Fold1 3 (new body)
    with BuildSketch(Plane.YZ.offset(FOLD1_START_3)):
        with Locations((62.3951, -60.325)):
            Rectangle(FOLD1_3_OUTLINE_W, FOLD1_3_OUTLINE_H)
    extrude(amount=FOLD1_3_DEPTH)


with BuildPart() as body_3:
    # Fold1 4 outline → Fold1 4 (new body)
    with BuildSketch(Plane.YZ.offset(FOLD1_START_4)):
        with Locations((62.3951, -60.325)):
            Rectangle(FOLD1_4_OUTLINE_W, FOLD1_4_OUTLINE_H)
    extrude(amount=FOLD1_4_DEPTH)


with BuildPart() as part_1:
    add(part.part)

    add(body_2.part)  # Fold1 7 merges body 2
    # Fold1 7 outline → Fold1 7 (add)
    with BuildSketch(Plane.YZ):
        with Locations((31.0134, -60.325)):
            Rectangle(FOLD1_7_OUTLINE_W, FOLD1_7_OUTLINE_H)
        with Locations((5.34289, -52.26558)):
            Circle(FOLD1_7_OUTLINE_R, mode=Mode.SUBTRACT)
        with Locations((13.843, -44.21124)):
            Circle(FOLD1_7_OUTLINE_R_2, mode=Mode.SUBTRACT)
        with Locations((13.843, -32.01416)):
            Circle(FOLD1_7_OUTLINE_R_3, mode=Mode.SUBTRACT)
        with Locations((22.34311, -52.26558)):
            Circle(FOLD1_7_OUTLINE_R, mode=Mode.SUBTRACT)
        with Locations((4.84378, -24.0157)):
            Circle(FOLD1_7_OUTLINE_R, mode=Mode.SUBTRACT)
        with Locations((22.84222, -24.0157)):
            Circle(FOLD1_7_OUTLINE_R, mode=Mode.SUBTRACT)
    extrude(amount=FOLD1_7_DEPTH)


    add(body_3.part)  # Fold1 8 merges body 3
    # Fold1 8 outline → Fold1 8 (add)
    with BuildSketch(Plane.YZ.offset(FOLD1_START_7)):
        with Locations((31.0134, -60.325)):
            Rectangle(FOLD1_8_OUTLINE_W, FOLD1_8_OUTLINE_H)
        with Locations((5.34289, -52.26558)):
            Circle(FOLD1_8_OUTLINE_R, mode=Mode.SUBTRACT)
        with Locations((13.843, -44.21124)):
            Circle(FOLD1_8_OUTLINE_R_2, mode=Mode.SUBTRACT)
        with Locations((13.843, -32.01416)):
            Circle(FOLD1_8_OUTLINE_R_3, mode=Mode.SUBTRACT)
        with Locations((22.34311, -52.26558)):
            Circle(FOLD1_8_OUTLINE_R, mode=Mode.SUBTRACT)
        with Locations((4.84378, -24.0157)):
            Circle(FOLD1_8_OUTLINE_R, mode=Mode.SUBTRACT)
        with Locations((22.84222, -24.0157)):
            Circle(FOLD1_8_OUTLINE_R, mode=Mode.SUBTRACT)
    extrude(amount=FOLD1_8_DEPTH)

    # Fold1 9 outline → Fold1 9 (cut)
    with BuildSketch(Plane.XY.offset(FOLD1_START_8)):
        with BuildLine():
            Line((0.151356568, -0.7366), (1.4732, -0.7366))
            ThreePointArc((1.4732, -0.7366), (0.43149029, -0.30510971), (0, 0.7366))
            Line((0, 0.7366), (0, 0))
            Line((0, 0), (0.151356568, 0))
            Line((0.151356568, 0), (0.151356568, -0.7366))
        make_face()
        with BuildLine():
            ThreePointArc((123.0884, 61.2902), (122.872654855, 61.811054855), (122.3518, 62.0268))
            Line((122.3518, 62.0268), (122.3518, 0))
            ThreePointArc((122.3518, 0), (122.872654855, 0.215745145), (123.0884, 0.7366))
            Line((123.0884, 0.7366), (123.0884, 61.2902))
        make_face()
        with BuildLine():
            ThreePointArc((123.627628625, 62.0268), (123.774801927, 61.671492217), (123.825, 61.2902))
            Line((123.825, 61.2902), (123.825, 62.0268))
            Line((123.825, 62.0268), (123.627628625, 62.0268))
        make_face()
        with BuildLine():
            ThreePointArc((123.825, 0.7366), (123.39350971, -0.30510971), (122.3518, -0.7366))
            Line((122.3518, -0.7366), (123.673643432, -0.7366))
            Line((123.673643432, -0.7366), (123.673643432, 0))
            Line((123.673643432, 0), (123.825, 0))
            Line((123.825, 0), (123.825, 0.7366))
        make_face()
        with BuildLine():
            Line((1.4732, 0), (1.4732, 62.0268))
            ThreePointArc((1.4732, 62.0268), (0.952345145, 61.811054855), (0.7366, 61.2902))
            Line((0.7366, 61.2902), (0.7366, 0.7366))
            ThreePointArc((0.7366, 0.7366), (0.952345145, 0.215745145), (1.4732, 0))
        make_face()
        with BuildLine():
            Line((0, 62.0268), (0, 61.2902))
            ThreePointArc((0, 61.2902), (0.050198073, 61.671492217), (0.197371375, 62.0268))
            Line((0.197371375, 62.0268), (0, 62.0268))
        make_face()
    extrude(amount=FOLD1_9_DEPTH, mode=Mode.SUBTRACT)

    # Fold1 10 outline → Fold1 10 (add)
    with BuildSketch(Plane.XY.offset(FOLD1_START_8)):
        with BuildLine():
            Line((122.3518, 62.0268), (123.627628625, 62.0268))
            ThreePointArc((123.627628625, 62.0268), (123.0884, 62.566028625), (122.3518, 62.7634))
            Line((122.3518, 62.7634), (122.3518, 62.0268))
        make_face()
        with BuildLine():
            ThreePointArc((1.4732, 62.7634), (0.7366, 62.566028625), (0.197371375, 62.0268))
            Line((0.197371375, 62.0268), (1.4732, 62.0268))
            Line((1.4732, 62.0268), (1.4732, 62.7634))
        make_face()
    extrude(amount=FOLD1_10_DEPTH)


solid = part_1.part
